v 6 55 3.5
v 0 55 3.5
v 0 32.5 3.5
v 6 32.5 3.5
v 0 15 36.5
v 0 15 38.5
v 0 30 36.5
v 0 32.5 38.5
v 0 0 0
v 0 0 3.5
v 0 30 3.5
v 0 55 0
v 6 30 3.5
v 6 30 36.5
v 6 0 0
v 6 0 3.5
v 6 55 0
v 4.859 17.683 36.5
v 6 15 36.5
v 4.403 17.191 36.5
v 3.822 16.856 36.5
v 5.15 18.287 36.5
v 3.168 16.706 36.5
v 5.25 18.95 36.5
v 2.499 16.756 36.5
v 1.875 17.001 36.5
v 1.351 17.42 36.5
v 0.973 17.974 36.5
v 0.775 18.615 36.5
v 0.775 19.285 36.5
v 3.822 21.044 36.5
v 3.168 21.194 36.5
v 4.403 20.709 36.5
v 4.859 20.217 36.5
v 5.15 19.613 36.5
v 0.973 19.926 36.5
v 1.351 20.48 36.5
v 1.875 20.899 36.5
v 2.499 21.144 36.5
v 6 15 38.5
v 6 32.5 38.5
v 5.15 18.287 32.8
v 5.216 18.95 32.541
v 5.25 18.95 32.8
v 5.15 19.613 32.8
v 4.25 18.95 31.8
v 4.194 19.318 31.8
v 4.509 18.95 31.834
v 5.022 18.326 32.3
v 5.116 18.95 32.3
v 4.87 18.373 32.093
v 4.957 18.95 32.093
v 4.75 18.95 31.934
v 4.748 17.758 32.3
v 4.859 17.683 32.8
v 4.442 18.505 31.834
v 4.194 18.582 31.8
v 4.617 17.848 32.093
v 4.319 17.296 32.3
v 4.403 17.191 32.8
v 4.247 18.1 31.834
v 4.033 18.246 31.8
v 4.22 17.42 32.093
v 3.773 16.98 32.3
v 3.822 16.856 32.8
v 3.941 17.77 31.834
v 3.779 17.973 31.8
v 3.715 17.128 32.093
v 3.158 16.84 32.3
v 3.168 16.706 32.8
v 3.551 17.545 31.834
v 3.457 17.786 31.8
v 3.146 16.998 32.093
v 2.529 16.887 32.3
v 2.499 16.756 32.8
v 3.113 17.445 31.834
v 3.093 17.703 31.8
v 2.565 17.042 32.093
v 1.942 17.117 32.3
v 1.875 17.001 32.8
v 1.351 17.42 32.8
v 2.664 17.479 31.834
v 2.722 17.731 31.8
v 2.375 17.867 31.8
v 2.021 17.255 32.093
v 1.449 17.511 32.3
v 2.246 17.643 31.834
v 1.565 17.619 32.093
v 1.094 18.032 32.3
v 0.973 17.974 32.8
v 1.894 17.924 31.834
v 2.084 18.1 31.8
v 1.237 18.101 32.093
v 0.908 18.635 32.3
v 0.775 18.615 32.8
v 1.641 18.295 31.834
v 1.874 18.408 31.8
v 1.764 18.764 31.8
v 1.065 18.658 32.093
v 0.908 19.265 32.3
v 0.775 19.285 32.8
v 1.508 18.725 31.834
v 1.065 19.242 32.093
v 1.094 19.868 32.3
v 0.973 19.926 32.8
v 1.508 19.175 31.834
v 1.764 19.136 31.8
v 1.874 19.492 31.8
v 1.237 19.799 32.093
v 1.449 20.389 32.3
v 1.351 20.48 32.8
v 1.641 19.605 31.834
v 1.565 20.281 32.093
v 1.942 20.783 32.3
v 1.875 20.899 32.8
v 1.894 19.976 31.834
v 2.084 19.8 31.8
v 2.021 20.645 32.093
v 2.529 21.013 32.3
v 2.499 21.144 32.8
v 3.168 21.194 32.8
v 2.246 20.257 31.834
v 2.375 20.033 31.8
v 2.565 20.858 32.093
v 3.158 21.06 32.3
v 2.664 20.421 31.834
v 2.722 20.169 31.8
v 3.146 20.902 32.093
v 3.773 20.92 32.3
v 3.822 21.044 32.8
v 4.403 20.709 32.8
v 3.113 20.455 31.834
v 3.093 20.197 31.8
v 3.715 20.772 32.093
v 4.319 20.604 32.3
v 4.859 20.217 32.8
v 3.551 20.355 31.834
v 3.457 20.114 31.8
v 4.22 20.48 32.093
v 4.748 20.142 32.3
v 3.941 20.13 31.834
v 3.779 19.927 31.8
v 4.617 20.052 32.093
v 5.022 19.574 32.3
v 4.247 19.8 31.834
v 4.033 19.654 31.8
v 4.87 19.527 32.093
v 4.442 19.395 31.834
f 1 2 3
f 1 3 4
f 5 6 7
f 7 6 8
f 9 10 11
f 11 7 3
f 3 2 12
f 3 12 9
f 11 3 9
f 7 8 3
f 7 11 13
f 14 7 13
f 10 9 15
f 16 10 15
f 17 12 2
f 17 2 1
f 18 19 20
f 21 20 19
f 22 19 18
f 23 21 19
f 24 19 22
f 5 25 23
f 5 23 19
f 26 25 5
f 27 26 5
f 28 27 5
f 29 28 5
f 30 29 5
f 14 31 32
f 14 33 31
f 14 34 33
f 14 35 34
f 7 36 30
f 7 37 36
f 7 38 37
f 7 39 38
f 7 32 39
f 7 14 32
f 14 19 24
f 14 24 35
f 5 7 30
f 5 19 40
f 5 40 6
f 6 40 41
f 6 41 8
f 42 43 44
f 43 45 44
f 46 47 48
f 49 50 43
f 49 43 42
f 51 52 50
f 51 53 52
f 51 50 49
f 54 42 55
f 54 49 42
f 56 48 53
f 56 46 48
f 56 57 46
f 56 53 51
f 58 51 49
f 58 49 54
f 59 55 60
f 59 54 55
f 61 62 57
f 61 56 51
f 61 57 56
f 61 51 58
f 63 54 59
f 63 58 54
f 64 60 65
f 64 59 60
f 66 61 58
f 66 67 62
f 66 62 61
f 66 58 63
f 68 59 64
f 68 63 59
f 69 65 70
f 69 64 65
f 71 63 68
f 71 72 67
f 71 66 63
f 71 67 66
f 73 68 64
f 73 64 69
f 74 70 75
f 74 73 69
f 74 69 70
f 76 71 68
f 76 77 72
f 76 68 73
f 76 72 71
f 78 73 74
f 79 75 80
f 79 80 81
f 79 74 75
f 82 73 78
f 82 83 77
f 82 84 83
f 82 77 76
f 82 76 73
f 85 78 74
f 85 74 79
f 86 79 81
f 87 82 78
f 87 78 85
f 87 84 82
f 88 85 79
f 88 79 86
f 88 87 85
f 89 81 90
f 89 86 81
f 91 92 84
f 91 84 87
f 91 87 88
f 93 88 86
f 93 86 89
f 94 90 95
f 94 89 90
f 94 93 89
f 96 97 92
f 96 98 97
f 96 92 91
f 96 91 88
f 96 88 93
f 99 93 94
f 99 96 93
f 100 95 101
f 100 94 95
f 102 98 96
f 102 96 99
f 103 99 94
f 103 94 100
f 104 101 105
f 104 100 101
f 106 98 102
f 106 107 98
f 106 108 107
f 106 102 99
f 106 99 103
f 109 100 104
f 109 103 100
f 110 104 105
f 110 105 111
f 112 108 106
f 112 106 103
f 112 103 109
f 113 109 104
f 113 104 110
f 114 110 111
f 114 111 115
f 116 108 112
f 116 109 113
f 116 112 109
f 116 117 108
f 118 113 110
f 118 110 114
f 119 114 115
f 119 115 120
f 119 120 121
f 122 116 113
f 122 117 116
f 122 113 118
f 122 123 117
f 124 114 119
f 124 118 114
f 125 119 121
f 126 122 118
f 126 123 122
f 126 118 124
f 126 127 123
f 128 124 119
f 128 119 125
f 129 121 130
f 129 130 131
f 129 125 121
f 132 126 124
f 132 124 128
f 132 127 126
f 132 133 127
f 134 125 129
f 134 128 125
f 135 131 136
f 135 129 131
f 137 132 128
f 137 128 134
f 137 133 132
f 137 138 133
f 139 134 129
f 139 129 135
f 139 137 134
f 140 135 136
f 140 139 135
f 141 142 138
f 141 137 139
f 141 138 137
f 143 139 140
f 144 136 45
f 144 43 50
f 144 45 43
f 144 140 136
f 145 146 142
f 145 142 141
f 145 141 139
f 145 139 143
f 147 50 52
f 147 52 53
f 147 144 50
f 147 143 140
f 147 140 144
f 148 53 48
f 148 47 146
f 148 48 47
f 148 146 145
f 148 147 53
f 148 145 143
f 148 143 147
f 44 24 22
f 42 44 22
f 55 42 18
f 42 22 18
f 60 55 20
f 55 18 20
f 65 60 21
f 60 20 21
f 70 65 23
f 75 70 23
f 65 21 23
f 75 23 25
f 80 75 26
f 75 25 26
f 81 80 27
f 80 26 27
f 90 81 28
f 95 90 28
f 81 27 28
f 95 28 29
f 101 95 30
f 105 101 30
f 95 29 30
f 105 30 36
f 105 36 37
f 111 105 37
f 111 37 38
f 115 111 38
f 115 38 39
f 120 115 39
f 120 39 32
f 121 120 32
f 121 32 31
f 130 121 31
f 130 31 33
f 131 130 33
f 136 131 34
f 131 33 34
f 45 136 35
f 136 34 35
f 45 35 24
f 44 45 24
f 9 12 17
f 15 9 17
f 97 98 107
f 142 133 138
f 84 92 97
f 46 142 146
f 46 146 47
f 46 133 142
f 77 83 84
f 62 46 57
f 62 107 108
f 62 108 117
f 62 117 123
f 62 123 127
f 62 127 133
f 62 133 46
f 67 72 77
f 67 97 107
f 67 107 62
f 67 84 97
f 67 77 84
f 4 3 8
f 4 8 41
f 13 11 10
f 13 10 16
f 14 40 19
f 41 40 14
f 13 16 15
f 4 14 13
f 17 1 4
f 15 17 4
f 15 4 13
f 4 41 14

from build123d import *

# Parameters (mm, degrees)
ESQUISSE1_W        = 6
ESQUISSE1_H        = 55
BOSS_EXTRU_1_DEPTH = 3.5
ESQUISSE2_W        = 6
ESQUISSE2_H        = 2.5
BOSS_EXTRU_2_DEPTH = 35
ESQUISSE4_W        = 6
ESQUISSE4_H        = 2
BOSS_EXTRU_3_DEPTH = 15
ESQUISSE10_R       = 2.25
BOSS_EXTRU_4_DEPTH = 4.7
CONG_5_R           = 1


with BuildPart() as part:
    # Esquisse1 → Boss.-Extru.1 (new body)
    with BuildSketch(Plane.XY):
        with Locations((3, 27.5)):
            Rectangle(ESQUISSE1_W, ESQUISSE1_H)
    extrude(amount=BOSS_EXTRU_1_DEPTH)

    # Esquisse2 → Boss.-Extru.2 (add)
    with BuildSketch(Plane.XY.offset(3.5)):
        with Locations((3, 31.25)):
            Rectangle(ESQUISSE2_W, ESQUISSE2_H)
    extrude(amount=BOSS_EXTRU_2_DEPTH)

    # Esquisse4 → Boss.-Extru.3 (add)
    with BuildSketch(Plane(origin=(0, 30, 0), x_dir=(-1, 0, 0), z_dir=(0, -1, 0))):
        with Locations((-3, -37.5)):
            Rectangle(ESQUISSE4_W, ESQUISSE4_H)
    extrude(amount=BOSS_EXTRU_3_DEPTH)

    # Esquisse10 → Boss.-Extru.4 (add)
    with BuildSketch(Plane(origin=(0, 0, 36.5), x_dir=(-1, 0, 0), z_dir=(0, 0, -1))):
        with Locations(Location((-3, 18.95, 0), (0, 0, 180))):
            Circle(ESQUISSE10_R)
    extrude(amount=BOSS_EXTRU_4_DEPTH)

    # Congé5
    cong_5_edges = [part.edges().sort_by_distance(p)[0] for p in [
        (0.75, 18.95, 31.8),
    ]]
    fillet(cong_5_edges, radius=CONG_5_R)


solid = part.part
